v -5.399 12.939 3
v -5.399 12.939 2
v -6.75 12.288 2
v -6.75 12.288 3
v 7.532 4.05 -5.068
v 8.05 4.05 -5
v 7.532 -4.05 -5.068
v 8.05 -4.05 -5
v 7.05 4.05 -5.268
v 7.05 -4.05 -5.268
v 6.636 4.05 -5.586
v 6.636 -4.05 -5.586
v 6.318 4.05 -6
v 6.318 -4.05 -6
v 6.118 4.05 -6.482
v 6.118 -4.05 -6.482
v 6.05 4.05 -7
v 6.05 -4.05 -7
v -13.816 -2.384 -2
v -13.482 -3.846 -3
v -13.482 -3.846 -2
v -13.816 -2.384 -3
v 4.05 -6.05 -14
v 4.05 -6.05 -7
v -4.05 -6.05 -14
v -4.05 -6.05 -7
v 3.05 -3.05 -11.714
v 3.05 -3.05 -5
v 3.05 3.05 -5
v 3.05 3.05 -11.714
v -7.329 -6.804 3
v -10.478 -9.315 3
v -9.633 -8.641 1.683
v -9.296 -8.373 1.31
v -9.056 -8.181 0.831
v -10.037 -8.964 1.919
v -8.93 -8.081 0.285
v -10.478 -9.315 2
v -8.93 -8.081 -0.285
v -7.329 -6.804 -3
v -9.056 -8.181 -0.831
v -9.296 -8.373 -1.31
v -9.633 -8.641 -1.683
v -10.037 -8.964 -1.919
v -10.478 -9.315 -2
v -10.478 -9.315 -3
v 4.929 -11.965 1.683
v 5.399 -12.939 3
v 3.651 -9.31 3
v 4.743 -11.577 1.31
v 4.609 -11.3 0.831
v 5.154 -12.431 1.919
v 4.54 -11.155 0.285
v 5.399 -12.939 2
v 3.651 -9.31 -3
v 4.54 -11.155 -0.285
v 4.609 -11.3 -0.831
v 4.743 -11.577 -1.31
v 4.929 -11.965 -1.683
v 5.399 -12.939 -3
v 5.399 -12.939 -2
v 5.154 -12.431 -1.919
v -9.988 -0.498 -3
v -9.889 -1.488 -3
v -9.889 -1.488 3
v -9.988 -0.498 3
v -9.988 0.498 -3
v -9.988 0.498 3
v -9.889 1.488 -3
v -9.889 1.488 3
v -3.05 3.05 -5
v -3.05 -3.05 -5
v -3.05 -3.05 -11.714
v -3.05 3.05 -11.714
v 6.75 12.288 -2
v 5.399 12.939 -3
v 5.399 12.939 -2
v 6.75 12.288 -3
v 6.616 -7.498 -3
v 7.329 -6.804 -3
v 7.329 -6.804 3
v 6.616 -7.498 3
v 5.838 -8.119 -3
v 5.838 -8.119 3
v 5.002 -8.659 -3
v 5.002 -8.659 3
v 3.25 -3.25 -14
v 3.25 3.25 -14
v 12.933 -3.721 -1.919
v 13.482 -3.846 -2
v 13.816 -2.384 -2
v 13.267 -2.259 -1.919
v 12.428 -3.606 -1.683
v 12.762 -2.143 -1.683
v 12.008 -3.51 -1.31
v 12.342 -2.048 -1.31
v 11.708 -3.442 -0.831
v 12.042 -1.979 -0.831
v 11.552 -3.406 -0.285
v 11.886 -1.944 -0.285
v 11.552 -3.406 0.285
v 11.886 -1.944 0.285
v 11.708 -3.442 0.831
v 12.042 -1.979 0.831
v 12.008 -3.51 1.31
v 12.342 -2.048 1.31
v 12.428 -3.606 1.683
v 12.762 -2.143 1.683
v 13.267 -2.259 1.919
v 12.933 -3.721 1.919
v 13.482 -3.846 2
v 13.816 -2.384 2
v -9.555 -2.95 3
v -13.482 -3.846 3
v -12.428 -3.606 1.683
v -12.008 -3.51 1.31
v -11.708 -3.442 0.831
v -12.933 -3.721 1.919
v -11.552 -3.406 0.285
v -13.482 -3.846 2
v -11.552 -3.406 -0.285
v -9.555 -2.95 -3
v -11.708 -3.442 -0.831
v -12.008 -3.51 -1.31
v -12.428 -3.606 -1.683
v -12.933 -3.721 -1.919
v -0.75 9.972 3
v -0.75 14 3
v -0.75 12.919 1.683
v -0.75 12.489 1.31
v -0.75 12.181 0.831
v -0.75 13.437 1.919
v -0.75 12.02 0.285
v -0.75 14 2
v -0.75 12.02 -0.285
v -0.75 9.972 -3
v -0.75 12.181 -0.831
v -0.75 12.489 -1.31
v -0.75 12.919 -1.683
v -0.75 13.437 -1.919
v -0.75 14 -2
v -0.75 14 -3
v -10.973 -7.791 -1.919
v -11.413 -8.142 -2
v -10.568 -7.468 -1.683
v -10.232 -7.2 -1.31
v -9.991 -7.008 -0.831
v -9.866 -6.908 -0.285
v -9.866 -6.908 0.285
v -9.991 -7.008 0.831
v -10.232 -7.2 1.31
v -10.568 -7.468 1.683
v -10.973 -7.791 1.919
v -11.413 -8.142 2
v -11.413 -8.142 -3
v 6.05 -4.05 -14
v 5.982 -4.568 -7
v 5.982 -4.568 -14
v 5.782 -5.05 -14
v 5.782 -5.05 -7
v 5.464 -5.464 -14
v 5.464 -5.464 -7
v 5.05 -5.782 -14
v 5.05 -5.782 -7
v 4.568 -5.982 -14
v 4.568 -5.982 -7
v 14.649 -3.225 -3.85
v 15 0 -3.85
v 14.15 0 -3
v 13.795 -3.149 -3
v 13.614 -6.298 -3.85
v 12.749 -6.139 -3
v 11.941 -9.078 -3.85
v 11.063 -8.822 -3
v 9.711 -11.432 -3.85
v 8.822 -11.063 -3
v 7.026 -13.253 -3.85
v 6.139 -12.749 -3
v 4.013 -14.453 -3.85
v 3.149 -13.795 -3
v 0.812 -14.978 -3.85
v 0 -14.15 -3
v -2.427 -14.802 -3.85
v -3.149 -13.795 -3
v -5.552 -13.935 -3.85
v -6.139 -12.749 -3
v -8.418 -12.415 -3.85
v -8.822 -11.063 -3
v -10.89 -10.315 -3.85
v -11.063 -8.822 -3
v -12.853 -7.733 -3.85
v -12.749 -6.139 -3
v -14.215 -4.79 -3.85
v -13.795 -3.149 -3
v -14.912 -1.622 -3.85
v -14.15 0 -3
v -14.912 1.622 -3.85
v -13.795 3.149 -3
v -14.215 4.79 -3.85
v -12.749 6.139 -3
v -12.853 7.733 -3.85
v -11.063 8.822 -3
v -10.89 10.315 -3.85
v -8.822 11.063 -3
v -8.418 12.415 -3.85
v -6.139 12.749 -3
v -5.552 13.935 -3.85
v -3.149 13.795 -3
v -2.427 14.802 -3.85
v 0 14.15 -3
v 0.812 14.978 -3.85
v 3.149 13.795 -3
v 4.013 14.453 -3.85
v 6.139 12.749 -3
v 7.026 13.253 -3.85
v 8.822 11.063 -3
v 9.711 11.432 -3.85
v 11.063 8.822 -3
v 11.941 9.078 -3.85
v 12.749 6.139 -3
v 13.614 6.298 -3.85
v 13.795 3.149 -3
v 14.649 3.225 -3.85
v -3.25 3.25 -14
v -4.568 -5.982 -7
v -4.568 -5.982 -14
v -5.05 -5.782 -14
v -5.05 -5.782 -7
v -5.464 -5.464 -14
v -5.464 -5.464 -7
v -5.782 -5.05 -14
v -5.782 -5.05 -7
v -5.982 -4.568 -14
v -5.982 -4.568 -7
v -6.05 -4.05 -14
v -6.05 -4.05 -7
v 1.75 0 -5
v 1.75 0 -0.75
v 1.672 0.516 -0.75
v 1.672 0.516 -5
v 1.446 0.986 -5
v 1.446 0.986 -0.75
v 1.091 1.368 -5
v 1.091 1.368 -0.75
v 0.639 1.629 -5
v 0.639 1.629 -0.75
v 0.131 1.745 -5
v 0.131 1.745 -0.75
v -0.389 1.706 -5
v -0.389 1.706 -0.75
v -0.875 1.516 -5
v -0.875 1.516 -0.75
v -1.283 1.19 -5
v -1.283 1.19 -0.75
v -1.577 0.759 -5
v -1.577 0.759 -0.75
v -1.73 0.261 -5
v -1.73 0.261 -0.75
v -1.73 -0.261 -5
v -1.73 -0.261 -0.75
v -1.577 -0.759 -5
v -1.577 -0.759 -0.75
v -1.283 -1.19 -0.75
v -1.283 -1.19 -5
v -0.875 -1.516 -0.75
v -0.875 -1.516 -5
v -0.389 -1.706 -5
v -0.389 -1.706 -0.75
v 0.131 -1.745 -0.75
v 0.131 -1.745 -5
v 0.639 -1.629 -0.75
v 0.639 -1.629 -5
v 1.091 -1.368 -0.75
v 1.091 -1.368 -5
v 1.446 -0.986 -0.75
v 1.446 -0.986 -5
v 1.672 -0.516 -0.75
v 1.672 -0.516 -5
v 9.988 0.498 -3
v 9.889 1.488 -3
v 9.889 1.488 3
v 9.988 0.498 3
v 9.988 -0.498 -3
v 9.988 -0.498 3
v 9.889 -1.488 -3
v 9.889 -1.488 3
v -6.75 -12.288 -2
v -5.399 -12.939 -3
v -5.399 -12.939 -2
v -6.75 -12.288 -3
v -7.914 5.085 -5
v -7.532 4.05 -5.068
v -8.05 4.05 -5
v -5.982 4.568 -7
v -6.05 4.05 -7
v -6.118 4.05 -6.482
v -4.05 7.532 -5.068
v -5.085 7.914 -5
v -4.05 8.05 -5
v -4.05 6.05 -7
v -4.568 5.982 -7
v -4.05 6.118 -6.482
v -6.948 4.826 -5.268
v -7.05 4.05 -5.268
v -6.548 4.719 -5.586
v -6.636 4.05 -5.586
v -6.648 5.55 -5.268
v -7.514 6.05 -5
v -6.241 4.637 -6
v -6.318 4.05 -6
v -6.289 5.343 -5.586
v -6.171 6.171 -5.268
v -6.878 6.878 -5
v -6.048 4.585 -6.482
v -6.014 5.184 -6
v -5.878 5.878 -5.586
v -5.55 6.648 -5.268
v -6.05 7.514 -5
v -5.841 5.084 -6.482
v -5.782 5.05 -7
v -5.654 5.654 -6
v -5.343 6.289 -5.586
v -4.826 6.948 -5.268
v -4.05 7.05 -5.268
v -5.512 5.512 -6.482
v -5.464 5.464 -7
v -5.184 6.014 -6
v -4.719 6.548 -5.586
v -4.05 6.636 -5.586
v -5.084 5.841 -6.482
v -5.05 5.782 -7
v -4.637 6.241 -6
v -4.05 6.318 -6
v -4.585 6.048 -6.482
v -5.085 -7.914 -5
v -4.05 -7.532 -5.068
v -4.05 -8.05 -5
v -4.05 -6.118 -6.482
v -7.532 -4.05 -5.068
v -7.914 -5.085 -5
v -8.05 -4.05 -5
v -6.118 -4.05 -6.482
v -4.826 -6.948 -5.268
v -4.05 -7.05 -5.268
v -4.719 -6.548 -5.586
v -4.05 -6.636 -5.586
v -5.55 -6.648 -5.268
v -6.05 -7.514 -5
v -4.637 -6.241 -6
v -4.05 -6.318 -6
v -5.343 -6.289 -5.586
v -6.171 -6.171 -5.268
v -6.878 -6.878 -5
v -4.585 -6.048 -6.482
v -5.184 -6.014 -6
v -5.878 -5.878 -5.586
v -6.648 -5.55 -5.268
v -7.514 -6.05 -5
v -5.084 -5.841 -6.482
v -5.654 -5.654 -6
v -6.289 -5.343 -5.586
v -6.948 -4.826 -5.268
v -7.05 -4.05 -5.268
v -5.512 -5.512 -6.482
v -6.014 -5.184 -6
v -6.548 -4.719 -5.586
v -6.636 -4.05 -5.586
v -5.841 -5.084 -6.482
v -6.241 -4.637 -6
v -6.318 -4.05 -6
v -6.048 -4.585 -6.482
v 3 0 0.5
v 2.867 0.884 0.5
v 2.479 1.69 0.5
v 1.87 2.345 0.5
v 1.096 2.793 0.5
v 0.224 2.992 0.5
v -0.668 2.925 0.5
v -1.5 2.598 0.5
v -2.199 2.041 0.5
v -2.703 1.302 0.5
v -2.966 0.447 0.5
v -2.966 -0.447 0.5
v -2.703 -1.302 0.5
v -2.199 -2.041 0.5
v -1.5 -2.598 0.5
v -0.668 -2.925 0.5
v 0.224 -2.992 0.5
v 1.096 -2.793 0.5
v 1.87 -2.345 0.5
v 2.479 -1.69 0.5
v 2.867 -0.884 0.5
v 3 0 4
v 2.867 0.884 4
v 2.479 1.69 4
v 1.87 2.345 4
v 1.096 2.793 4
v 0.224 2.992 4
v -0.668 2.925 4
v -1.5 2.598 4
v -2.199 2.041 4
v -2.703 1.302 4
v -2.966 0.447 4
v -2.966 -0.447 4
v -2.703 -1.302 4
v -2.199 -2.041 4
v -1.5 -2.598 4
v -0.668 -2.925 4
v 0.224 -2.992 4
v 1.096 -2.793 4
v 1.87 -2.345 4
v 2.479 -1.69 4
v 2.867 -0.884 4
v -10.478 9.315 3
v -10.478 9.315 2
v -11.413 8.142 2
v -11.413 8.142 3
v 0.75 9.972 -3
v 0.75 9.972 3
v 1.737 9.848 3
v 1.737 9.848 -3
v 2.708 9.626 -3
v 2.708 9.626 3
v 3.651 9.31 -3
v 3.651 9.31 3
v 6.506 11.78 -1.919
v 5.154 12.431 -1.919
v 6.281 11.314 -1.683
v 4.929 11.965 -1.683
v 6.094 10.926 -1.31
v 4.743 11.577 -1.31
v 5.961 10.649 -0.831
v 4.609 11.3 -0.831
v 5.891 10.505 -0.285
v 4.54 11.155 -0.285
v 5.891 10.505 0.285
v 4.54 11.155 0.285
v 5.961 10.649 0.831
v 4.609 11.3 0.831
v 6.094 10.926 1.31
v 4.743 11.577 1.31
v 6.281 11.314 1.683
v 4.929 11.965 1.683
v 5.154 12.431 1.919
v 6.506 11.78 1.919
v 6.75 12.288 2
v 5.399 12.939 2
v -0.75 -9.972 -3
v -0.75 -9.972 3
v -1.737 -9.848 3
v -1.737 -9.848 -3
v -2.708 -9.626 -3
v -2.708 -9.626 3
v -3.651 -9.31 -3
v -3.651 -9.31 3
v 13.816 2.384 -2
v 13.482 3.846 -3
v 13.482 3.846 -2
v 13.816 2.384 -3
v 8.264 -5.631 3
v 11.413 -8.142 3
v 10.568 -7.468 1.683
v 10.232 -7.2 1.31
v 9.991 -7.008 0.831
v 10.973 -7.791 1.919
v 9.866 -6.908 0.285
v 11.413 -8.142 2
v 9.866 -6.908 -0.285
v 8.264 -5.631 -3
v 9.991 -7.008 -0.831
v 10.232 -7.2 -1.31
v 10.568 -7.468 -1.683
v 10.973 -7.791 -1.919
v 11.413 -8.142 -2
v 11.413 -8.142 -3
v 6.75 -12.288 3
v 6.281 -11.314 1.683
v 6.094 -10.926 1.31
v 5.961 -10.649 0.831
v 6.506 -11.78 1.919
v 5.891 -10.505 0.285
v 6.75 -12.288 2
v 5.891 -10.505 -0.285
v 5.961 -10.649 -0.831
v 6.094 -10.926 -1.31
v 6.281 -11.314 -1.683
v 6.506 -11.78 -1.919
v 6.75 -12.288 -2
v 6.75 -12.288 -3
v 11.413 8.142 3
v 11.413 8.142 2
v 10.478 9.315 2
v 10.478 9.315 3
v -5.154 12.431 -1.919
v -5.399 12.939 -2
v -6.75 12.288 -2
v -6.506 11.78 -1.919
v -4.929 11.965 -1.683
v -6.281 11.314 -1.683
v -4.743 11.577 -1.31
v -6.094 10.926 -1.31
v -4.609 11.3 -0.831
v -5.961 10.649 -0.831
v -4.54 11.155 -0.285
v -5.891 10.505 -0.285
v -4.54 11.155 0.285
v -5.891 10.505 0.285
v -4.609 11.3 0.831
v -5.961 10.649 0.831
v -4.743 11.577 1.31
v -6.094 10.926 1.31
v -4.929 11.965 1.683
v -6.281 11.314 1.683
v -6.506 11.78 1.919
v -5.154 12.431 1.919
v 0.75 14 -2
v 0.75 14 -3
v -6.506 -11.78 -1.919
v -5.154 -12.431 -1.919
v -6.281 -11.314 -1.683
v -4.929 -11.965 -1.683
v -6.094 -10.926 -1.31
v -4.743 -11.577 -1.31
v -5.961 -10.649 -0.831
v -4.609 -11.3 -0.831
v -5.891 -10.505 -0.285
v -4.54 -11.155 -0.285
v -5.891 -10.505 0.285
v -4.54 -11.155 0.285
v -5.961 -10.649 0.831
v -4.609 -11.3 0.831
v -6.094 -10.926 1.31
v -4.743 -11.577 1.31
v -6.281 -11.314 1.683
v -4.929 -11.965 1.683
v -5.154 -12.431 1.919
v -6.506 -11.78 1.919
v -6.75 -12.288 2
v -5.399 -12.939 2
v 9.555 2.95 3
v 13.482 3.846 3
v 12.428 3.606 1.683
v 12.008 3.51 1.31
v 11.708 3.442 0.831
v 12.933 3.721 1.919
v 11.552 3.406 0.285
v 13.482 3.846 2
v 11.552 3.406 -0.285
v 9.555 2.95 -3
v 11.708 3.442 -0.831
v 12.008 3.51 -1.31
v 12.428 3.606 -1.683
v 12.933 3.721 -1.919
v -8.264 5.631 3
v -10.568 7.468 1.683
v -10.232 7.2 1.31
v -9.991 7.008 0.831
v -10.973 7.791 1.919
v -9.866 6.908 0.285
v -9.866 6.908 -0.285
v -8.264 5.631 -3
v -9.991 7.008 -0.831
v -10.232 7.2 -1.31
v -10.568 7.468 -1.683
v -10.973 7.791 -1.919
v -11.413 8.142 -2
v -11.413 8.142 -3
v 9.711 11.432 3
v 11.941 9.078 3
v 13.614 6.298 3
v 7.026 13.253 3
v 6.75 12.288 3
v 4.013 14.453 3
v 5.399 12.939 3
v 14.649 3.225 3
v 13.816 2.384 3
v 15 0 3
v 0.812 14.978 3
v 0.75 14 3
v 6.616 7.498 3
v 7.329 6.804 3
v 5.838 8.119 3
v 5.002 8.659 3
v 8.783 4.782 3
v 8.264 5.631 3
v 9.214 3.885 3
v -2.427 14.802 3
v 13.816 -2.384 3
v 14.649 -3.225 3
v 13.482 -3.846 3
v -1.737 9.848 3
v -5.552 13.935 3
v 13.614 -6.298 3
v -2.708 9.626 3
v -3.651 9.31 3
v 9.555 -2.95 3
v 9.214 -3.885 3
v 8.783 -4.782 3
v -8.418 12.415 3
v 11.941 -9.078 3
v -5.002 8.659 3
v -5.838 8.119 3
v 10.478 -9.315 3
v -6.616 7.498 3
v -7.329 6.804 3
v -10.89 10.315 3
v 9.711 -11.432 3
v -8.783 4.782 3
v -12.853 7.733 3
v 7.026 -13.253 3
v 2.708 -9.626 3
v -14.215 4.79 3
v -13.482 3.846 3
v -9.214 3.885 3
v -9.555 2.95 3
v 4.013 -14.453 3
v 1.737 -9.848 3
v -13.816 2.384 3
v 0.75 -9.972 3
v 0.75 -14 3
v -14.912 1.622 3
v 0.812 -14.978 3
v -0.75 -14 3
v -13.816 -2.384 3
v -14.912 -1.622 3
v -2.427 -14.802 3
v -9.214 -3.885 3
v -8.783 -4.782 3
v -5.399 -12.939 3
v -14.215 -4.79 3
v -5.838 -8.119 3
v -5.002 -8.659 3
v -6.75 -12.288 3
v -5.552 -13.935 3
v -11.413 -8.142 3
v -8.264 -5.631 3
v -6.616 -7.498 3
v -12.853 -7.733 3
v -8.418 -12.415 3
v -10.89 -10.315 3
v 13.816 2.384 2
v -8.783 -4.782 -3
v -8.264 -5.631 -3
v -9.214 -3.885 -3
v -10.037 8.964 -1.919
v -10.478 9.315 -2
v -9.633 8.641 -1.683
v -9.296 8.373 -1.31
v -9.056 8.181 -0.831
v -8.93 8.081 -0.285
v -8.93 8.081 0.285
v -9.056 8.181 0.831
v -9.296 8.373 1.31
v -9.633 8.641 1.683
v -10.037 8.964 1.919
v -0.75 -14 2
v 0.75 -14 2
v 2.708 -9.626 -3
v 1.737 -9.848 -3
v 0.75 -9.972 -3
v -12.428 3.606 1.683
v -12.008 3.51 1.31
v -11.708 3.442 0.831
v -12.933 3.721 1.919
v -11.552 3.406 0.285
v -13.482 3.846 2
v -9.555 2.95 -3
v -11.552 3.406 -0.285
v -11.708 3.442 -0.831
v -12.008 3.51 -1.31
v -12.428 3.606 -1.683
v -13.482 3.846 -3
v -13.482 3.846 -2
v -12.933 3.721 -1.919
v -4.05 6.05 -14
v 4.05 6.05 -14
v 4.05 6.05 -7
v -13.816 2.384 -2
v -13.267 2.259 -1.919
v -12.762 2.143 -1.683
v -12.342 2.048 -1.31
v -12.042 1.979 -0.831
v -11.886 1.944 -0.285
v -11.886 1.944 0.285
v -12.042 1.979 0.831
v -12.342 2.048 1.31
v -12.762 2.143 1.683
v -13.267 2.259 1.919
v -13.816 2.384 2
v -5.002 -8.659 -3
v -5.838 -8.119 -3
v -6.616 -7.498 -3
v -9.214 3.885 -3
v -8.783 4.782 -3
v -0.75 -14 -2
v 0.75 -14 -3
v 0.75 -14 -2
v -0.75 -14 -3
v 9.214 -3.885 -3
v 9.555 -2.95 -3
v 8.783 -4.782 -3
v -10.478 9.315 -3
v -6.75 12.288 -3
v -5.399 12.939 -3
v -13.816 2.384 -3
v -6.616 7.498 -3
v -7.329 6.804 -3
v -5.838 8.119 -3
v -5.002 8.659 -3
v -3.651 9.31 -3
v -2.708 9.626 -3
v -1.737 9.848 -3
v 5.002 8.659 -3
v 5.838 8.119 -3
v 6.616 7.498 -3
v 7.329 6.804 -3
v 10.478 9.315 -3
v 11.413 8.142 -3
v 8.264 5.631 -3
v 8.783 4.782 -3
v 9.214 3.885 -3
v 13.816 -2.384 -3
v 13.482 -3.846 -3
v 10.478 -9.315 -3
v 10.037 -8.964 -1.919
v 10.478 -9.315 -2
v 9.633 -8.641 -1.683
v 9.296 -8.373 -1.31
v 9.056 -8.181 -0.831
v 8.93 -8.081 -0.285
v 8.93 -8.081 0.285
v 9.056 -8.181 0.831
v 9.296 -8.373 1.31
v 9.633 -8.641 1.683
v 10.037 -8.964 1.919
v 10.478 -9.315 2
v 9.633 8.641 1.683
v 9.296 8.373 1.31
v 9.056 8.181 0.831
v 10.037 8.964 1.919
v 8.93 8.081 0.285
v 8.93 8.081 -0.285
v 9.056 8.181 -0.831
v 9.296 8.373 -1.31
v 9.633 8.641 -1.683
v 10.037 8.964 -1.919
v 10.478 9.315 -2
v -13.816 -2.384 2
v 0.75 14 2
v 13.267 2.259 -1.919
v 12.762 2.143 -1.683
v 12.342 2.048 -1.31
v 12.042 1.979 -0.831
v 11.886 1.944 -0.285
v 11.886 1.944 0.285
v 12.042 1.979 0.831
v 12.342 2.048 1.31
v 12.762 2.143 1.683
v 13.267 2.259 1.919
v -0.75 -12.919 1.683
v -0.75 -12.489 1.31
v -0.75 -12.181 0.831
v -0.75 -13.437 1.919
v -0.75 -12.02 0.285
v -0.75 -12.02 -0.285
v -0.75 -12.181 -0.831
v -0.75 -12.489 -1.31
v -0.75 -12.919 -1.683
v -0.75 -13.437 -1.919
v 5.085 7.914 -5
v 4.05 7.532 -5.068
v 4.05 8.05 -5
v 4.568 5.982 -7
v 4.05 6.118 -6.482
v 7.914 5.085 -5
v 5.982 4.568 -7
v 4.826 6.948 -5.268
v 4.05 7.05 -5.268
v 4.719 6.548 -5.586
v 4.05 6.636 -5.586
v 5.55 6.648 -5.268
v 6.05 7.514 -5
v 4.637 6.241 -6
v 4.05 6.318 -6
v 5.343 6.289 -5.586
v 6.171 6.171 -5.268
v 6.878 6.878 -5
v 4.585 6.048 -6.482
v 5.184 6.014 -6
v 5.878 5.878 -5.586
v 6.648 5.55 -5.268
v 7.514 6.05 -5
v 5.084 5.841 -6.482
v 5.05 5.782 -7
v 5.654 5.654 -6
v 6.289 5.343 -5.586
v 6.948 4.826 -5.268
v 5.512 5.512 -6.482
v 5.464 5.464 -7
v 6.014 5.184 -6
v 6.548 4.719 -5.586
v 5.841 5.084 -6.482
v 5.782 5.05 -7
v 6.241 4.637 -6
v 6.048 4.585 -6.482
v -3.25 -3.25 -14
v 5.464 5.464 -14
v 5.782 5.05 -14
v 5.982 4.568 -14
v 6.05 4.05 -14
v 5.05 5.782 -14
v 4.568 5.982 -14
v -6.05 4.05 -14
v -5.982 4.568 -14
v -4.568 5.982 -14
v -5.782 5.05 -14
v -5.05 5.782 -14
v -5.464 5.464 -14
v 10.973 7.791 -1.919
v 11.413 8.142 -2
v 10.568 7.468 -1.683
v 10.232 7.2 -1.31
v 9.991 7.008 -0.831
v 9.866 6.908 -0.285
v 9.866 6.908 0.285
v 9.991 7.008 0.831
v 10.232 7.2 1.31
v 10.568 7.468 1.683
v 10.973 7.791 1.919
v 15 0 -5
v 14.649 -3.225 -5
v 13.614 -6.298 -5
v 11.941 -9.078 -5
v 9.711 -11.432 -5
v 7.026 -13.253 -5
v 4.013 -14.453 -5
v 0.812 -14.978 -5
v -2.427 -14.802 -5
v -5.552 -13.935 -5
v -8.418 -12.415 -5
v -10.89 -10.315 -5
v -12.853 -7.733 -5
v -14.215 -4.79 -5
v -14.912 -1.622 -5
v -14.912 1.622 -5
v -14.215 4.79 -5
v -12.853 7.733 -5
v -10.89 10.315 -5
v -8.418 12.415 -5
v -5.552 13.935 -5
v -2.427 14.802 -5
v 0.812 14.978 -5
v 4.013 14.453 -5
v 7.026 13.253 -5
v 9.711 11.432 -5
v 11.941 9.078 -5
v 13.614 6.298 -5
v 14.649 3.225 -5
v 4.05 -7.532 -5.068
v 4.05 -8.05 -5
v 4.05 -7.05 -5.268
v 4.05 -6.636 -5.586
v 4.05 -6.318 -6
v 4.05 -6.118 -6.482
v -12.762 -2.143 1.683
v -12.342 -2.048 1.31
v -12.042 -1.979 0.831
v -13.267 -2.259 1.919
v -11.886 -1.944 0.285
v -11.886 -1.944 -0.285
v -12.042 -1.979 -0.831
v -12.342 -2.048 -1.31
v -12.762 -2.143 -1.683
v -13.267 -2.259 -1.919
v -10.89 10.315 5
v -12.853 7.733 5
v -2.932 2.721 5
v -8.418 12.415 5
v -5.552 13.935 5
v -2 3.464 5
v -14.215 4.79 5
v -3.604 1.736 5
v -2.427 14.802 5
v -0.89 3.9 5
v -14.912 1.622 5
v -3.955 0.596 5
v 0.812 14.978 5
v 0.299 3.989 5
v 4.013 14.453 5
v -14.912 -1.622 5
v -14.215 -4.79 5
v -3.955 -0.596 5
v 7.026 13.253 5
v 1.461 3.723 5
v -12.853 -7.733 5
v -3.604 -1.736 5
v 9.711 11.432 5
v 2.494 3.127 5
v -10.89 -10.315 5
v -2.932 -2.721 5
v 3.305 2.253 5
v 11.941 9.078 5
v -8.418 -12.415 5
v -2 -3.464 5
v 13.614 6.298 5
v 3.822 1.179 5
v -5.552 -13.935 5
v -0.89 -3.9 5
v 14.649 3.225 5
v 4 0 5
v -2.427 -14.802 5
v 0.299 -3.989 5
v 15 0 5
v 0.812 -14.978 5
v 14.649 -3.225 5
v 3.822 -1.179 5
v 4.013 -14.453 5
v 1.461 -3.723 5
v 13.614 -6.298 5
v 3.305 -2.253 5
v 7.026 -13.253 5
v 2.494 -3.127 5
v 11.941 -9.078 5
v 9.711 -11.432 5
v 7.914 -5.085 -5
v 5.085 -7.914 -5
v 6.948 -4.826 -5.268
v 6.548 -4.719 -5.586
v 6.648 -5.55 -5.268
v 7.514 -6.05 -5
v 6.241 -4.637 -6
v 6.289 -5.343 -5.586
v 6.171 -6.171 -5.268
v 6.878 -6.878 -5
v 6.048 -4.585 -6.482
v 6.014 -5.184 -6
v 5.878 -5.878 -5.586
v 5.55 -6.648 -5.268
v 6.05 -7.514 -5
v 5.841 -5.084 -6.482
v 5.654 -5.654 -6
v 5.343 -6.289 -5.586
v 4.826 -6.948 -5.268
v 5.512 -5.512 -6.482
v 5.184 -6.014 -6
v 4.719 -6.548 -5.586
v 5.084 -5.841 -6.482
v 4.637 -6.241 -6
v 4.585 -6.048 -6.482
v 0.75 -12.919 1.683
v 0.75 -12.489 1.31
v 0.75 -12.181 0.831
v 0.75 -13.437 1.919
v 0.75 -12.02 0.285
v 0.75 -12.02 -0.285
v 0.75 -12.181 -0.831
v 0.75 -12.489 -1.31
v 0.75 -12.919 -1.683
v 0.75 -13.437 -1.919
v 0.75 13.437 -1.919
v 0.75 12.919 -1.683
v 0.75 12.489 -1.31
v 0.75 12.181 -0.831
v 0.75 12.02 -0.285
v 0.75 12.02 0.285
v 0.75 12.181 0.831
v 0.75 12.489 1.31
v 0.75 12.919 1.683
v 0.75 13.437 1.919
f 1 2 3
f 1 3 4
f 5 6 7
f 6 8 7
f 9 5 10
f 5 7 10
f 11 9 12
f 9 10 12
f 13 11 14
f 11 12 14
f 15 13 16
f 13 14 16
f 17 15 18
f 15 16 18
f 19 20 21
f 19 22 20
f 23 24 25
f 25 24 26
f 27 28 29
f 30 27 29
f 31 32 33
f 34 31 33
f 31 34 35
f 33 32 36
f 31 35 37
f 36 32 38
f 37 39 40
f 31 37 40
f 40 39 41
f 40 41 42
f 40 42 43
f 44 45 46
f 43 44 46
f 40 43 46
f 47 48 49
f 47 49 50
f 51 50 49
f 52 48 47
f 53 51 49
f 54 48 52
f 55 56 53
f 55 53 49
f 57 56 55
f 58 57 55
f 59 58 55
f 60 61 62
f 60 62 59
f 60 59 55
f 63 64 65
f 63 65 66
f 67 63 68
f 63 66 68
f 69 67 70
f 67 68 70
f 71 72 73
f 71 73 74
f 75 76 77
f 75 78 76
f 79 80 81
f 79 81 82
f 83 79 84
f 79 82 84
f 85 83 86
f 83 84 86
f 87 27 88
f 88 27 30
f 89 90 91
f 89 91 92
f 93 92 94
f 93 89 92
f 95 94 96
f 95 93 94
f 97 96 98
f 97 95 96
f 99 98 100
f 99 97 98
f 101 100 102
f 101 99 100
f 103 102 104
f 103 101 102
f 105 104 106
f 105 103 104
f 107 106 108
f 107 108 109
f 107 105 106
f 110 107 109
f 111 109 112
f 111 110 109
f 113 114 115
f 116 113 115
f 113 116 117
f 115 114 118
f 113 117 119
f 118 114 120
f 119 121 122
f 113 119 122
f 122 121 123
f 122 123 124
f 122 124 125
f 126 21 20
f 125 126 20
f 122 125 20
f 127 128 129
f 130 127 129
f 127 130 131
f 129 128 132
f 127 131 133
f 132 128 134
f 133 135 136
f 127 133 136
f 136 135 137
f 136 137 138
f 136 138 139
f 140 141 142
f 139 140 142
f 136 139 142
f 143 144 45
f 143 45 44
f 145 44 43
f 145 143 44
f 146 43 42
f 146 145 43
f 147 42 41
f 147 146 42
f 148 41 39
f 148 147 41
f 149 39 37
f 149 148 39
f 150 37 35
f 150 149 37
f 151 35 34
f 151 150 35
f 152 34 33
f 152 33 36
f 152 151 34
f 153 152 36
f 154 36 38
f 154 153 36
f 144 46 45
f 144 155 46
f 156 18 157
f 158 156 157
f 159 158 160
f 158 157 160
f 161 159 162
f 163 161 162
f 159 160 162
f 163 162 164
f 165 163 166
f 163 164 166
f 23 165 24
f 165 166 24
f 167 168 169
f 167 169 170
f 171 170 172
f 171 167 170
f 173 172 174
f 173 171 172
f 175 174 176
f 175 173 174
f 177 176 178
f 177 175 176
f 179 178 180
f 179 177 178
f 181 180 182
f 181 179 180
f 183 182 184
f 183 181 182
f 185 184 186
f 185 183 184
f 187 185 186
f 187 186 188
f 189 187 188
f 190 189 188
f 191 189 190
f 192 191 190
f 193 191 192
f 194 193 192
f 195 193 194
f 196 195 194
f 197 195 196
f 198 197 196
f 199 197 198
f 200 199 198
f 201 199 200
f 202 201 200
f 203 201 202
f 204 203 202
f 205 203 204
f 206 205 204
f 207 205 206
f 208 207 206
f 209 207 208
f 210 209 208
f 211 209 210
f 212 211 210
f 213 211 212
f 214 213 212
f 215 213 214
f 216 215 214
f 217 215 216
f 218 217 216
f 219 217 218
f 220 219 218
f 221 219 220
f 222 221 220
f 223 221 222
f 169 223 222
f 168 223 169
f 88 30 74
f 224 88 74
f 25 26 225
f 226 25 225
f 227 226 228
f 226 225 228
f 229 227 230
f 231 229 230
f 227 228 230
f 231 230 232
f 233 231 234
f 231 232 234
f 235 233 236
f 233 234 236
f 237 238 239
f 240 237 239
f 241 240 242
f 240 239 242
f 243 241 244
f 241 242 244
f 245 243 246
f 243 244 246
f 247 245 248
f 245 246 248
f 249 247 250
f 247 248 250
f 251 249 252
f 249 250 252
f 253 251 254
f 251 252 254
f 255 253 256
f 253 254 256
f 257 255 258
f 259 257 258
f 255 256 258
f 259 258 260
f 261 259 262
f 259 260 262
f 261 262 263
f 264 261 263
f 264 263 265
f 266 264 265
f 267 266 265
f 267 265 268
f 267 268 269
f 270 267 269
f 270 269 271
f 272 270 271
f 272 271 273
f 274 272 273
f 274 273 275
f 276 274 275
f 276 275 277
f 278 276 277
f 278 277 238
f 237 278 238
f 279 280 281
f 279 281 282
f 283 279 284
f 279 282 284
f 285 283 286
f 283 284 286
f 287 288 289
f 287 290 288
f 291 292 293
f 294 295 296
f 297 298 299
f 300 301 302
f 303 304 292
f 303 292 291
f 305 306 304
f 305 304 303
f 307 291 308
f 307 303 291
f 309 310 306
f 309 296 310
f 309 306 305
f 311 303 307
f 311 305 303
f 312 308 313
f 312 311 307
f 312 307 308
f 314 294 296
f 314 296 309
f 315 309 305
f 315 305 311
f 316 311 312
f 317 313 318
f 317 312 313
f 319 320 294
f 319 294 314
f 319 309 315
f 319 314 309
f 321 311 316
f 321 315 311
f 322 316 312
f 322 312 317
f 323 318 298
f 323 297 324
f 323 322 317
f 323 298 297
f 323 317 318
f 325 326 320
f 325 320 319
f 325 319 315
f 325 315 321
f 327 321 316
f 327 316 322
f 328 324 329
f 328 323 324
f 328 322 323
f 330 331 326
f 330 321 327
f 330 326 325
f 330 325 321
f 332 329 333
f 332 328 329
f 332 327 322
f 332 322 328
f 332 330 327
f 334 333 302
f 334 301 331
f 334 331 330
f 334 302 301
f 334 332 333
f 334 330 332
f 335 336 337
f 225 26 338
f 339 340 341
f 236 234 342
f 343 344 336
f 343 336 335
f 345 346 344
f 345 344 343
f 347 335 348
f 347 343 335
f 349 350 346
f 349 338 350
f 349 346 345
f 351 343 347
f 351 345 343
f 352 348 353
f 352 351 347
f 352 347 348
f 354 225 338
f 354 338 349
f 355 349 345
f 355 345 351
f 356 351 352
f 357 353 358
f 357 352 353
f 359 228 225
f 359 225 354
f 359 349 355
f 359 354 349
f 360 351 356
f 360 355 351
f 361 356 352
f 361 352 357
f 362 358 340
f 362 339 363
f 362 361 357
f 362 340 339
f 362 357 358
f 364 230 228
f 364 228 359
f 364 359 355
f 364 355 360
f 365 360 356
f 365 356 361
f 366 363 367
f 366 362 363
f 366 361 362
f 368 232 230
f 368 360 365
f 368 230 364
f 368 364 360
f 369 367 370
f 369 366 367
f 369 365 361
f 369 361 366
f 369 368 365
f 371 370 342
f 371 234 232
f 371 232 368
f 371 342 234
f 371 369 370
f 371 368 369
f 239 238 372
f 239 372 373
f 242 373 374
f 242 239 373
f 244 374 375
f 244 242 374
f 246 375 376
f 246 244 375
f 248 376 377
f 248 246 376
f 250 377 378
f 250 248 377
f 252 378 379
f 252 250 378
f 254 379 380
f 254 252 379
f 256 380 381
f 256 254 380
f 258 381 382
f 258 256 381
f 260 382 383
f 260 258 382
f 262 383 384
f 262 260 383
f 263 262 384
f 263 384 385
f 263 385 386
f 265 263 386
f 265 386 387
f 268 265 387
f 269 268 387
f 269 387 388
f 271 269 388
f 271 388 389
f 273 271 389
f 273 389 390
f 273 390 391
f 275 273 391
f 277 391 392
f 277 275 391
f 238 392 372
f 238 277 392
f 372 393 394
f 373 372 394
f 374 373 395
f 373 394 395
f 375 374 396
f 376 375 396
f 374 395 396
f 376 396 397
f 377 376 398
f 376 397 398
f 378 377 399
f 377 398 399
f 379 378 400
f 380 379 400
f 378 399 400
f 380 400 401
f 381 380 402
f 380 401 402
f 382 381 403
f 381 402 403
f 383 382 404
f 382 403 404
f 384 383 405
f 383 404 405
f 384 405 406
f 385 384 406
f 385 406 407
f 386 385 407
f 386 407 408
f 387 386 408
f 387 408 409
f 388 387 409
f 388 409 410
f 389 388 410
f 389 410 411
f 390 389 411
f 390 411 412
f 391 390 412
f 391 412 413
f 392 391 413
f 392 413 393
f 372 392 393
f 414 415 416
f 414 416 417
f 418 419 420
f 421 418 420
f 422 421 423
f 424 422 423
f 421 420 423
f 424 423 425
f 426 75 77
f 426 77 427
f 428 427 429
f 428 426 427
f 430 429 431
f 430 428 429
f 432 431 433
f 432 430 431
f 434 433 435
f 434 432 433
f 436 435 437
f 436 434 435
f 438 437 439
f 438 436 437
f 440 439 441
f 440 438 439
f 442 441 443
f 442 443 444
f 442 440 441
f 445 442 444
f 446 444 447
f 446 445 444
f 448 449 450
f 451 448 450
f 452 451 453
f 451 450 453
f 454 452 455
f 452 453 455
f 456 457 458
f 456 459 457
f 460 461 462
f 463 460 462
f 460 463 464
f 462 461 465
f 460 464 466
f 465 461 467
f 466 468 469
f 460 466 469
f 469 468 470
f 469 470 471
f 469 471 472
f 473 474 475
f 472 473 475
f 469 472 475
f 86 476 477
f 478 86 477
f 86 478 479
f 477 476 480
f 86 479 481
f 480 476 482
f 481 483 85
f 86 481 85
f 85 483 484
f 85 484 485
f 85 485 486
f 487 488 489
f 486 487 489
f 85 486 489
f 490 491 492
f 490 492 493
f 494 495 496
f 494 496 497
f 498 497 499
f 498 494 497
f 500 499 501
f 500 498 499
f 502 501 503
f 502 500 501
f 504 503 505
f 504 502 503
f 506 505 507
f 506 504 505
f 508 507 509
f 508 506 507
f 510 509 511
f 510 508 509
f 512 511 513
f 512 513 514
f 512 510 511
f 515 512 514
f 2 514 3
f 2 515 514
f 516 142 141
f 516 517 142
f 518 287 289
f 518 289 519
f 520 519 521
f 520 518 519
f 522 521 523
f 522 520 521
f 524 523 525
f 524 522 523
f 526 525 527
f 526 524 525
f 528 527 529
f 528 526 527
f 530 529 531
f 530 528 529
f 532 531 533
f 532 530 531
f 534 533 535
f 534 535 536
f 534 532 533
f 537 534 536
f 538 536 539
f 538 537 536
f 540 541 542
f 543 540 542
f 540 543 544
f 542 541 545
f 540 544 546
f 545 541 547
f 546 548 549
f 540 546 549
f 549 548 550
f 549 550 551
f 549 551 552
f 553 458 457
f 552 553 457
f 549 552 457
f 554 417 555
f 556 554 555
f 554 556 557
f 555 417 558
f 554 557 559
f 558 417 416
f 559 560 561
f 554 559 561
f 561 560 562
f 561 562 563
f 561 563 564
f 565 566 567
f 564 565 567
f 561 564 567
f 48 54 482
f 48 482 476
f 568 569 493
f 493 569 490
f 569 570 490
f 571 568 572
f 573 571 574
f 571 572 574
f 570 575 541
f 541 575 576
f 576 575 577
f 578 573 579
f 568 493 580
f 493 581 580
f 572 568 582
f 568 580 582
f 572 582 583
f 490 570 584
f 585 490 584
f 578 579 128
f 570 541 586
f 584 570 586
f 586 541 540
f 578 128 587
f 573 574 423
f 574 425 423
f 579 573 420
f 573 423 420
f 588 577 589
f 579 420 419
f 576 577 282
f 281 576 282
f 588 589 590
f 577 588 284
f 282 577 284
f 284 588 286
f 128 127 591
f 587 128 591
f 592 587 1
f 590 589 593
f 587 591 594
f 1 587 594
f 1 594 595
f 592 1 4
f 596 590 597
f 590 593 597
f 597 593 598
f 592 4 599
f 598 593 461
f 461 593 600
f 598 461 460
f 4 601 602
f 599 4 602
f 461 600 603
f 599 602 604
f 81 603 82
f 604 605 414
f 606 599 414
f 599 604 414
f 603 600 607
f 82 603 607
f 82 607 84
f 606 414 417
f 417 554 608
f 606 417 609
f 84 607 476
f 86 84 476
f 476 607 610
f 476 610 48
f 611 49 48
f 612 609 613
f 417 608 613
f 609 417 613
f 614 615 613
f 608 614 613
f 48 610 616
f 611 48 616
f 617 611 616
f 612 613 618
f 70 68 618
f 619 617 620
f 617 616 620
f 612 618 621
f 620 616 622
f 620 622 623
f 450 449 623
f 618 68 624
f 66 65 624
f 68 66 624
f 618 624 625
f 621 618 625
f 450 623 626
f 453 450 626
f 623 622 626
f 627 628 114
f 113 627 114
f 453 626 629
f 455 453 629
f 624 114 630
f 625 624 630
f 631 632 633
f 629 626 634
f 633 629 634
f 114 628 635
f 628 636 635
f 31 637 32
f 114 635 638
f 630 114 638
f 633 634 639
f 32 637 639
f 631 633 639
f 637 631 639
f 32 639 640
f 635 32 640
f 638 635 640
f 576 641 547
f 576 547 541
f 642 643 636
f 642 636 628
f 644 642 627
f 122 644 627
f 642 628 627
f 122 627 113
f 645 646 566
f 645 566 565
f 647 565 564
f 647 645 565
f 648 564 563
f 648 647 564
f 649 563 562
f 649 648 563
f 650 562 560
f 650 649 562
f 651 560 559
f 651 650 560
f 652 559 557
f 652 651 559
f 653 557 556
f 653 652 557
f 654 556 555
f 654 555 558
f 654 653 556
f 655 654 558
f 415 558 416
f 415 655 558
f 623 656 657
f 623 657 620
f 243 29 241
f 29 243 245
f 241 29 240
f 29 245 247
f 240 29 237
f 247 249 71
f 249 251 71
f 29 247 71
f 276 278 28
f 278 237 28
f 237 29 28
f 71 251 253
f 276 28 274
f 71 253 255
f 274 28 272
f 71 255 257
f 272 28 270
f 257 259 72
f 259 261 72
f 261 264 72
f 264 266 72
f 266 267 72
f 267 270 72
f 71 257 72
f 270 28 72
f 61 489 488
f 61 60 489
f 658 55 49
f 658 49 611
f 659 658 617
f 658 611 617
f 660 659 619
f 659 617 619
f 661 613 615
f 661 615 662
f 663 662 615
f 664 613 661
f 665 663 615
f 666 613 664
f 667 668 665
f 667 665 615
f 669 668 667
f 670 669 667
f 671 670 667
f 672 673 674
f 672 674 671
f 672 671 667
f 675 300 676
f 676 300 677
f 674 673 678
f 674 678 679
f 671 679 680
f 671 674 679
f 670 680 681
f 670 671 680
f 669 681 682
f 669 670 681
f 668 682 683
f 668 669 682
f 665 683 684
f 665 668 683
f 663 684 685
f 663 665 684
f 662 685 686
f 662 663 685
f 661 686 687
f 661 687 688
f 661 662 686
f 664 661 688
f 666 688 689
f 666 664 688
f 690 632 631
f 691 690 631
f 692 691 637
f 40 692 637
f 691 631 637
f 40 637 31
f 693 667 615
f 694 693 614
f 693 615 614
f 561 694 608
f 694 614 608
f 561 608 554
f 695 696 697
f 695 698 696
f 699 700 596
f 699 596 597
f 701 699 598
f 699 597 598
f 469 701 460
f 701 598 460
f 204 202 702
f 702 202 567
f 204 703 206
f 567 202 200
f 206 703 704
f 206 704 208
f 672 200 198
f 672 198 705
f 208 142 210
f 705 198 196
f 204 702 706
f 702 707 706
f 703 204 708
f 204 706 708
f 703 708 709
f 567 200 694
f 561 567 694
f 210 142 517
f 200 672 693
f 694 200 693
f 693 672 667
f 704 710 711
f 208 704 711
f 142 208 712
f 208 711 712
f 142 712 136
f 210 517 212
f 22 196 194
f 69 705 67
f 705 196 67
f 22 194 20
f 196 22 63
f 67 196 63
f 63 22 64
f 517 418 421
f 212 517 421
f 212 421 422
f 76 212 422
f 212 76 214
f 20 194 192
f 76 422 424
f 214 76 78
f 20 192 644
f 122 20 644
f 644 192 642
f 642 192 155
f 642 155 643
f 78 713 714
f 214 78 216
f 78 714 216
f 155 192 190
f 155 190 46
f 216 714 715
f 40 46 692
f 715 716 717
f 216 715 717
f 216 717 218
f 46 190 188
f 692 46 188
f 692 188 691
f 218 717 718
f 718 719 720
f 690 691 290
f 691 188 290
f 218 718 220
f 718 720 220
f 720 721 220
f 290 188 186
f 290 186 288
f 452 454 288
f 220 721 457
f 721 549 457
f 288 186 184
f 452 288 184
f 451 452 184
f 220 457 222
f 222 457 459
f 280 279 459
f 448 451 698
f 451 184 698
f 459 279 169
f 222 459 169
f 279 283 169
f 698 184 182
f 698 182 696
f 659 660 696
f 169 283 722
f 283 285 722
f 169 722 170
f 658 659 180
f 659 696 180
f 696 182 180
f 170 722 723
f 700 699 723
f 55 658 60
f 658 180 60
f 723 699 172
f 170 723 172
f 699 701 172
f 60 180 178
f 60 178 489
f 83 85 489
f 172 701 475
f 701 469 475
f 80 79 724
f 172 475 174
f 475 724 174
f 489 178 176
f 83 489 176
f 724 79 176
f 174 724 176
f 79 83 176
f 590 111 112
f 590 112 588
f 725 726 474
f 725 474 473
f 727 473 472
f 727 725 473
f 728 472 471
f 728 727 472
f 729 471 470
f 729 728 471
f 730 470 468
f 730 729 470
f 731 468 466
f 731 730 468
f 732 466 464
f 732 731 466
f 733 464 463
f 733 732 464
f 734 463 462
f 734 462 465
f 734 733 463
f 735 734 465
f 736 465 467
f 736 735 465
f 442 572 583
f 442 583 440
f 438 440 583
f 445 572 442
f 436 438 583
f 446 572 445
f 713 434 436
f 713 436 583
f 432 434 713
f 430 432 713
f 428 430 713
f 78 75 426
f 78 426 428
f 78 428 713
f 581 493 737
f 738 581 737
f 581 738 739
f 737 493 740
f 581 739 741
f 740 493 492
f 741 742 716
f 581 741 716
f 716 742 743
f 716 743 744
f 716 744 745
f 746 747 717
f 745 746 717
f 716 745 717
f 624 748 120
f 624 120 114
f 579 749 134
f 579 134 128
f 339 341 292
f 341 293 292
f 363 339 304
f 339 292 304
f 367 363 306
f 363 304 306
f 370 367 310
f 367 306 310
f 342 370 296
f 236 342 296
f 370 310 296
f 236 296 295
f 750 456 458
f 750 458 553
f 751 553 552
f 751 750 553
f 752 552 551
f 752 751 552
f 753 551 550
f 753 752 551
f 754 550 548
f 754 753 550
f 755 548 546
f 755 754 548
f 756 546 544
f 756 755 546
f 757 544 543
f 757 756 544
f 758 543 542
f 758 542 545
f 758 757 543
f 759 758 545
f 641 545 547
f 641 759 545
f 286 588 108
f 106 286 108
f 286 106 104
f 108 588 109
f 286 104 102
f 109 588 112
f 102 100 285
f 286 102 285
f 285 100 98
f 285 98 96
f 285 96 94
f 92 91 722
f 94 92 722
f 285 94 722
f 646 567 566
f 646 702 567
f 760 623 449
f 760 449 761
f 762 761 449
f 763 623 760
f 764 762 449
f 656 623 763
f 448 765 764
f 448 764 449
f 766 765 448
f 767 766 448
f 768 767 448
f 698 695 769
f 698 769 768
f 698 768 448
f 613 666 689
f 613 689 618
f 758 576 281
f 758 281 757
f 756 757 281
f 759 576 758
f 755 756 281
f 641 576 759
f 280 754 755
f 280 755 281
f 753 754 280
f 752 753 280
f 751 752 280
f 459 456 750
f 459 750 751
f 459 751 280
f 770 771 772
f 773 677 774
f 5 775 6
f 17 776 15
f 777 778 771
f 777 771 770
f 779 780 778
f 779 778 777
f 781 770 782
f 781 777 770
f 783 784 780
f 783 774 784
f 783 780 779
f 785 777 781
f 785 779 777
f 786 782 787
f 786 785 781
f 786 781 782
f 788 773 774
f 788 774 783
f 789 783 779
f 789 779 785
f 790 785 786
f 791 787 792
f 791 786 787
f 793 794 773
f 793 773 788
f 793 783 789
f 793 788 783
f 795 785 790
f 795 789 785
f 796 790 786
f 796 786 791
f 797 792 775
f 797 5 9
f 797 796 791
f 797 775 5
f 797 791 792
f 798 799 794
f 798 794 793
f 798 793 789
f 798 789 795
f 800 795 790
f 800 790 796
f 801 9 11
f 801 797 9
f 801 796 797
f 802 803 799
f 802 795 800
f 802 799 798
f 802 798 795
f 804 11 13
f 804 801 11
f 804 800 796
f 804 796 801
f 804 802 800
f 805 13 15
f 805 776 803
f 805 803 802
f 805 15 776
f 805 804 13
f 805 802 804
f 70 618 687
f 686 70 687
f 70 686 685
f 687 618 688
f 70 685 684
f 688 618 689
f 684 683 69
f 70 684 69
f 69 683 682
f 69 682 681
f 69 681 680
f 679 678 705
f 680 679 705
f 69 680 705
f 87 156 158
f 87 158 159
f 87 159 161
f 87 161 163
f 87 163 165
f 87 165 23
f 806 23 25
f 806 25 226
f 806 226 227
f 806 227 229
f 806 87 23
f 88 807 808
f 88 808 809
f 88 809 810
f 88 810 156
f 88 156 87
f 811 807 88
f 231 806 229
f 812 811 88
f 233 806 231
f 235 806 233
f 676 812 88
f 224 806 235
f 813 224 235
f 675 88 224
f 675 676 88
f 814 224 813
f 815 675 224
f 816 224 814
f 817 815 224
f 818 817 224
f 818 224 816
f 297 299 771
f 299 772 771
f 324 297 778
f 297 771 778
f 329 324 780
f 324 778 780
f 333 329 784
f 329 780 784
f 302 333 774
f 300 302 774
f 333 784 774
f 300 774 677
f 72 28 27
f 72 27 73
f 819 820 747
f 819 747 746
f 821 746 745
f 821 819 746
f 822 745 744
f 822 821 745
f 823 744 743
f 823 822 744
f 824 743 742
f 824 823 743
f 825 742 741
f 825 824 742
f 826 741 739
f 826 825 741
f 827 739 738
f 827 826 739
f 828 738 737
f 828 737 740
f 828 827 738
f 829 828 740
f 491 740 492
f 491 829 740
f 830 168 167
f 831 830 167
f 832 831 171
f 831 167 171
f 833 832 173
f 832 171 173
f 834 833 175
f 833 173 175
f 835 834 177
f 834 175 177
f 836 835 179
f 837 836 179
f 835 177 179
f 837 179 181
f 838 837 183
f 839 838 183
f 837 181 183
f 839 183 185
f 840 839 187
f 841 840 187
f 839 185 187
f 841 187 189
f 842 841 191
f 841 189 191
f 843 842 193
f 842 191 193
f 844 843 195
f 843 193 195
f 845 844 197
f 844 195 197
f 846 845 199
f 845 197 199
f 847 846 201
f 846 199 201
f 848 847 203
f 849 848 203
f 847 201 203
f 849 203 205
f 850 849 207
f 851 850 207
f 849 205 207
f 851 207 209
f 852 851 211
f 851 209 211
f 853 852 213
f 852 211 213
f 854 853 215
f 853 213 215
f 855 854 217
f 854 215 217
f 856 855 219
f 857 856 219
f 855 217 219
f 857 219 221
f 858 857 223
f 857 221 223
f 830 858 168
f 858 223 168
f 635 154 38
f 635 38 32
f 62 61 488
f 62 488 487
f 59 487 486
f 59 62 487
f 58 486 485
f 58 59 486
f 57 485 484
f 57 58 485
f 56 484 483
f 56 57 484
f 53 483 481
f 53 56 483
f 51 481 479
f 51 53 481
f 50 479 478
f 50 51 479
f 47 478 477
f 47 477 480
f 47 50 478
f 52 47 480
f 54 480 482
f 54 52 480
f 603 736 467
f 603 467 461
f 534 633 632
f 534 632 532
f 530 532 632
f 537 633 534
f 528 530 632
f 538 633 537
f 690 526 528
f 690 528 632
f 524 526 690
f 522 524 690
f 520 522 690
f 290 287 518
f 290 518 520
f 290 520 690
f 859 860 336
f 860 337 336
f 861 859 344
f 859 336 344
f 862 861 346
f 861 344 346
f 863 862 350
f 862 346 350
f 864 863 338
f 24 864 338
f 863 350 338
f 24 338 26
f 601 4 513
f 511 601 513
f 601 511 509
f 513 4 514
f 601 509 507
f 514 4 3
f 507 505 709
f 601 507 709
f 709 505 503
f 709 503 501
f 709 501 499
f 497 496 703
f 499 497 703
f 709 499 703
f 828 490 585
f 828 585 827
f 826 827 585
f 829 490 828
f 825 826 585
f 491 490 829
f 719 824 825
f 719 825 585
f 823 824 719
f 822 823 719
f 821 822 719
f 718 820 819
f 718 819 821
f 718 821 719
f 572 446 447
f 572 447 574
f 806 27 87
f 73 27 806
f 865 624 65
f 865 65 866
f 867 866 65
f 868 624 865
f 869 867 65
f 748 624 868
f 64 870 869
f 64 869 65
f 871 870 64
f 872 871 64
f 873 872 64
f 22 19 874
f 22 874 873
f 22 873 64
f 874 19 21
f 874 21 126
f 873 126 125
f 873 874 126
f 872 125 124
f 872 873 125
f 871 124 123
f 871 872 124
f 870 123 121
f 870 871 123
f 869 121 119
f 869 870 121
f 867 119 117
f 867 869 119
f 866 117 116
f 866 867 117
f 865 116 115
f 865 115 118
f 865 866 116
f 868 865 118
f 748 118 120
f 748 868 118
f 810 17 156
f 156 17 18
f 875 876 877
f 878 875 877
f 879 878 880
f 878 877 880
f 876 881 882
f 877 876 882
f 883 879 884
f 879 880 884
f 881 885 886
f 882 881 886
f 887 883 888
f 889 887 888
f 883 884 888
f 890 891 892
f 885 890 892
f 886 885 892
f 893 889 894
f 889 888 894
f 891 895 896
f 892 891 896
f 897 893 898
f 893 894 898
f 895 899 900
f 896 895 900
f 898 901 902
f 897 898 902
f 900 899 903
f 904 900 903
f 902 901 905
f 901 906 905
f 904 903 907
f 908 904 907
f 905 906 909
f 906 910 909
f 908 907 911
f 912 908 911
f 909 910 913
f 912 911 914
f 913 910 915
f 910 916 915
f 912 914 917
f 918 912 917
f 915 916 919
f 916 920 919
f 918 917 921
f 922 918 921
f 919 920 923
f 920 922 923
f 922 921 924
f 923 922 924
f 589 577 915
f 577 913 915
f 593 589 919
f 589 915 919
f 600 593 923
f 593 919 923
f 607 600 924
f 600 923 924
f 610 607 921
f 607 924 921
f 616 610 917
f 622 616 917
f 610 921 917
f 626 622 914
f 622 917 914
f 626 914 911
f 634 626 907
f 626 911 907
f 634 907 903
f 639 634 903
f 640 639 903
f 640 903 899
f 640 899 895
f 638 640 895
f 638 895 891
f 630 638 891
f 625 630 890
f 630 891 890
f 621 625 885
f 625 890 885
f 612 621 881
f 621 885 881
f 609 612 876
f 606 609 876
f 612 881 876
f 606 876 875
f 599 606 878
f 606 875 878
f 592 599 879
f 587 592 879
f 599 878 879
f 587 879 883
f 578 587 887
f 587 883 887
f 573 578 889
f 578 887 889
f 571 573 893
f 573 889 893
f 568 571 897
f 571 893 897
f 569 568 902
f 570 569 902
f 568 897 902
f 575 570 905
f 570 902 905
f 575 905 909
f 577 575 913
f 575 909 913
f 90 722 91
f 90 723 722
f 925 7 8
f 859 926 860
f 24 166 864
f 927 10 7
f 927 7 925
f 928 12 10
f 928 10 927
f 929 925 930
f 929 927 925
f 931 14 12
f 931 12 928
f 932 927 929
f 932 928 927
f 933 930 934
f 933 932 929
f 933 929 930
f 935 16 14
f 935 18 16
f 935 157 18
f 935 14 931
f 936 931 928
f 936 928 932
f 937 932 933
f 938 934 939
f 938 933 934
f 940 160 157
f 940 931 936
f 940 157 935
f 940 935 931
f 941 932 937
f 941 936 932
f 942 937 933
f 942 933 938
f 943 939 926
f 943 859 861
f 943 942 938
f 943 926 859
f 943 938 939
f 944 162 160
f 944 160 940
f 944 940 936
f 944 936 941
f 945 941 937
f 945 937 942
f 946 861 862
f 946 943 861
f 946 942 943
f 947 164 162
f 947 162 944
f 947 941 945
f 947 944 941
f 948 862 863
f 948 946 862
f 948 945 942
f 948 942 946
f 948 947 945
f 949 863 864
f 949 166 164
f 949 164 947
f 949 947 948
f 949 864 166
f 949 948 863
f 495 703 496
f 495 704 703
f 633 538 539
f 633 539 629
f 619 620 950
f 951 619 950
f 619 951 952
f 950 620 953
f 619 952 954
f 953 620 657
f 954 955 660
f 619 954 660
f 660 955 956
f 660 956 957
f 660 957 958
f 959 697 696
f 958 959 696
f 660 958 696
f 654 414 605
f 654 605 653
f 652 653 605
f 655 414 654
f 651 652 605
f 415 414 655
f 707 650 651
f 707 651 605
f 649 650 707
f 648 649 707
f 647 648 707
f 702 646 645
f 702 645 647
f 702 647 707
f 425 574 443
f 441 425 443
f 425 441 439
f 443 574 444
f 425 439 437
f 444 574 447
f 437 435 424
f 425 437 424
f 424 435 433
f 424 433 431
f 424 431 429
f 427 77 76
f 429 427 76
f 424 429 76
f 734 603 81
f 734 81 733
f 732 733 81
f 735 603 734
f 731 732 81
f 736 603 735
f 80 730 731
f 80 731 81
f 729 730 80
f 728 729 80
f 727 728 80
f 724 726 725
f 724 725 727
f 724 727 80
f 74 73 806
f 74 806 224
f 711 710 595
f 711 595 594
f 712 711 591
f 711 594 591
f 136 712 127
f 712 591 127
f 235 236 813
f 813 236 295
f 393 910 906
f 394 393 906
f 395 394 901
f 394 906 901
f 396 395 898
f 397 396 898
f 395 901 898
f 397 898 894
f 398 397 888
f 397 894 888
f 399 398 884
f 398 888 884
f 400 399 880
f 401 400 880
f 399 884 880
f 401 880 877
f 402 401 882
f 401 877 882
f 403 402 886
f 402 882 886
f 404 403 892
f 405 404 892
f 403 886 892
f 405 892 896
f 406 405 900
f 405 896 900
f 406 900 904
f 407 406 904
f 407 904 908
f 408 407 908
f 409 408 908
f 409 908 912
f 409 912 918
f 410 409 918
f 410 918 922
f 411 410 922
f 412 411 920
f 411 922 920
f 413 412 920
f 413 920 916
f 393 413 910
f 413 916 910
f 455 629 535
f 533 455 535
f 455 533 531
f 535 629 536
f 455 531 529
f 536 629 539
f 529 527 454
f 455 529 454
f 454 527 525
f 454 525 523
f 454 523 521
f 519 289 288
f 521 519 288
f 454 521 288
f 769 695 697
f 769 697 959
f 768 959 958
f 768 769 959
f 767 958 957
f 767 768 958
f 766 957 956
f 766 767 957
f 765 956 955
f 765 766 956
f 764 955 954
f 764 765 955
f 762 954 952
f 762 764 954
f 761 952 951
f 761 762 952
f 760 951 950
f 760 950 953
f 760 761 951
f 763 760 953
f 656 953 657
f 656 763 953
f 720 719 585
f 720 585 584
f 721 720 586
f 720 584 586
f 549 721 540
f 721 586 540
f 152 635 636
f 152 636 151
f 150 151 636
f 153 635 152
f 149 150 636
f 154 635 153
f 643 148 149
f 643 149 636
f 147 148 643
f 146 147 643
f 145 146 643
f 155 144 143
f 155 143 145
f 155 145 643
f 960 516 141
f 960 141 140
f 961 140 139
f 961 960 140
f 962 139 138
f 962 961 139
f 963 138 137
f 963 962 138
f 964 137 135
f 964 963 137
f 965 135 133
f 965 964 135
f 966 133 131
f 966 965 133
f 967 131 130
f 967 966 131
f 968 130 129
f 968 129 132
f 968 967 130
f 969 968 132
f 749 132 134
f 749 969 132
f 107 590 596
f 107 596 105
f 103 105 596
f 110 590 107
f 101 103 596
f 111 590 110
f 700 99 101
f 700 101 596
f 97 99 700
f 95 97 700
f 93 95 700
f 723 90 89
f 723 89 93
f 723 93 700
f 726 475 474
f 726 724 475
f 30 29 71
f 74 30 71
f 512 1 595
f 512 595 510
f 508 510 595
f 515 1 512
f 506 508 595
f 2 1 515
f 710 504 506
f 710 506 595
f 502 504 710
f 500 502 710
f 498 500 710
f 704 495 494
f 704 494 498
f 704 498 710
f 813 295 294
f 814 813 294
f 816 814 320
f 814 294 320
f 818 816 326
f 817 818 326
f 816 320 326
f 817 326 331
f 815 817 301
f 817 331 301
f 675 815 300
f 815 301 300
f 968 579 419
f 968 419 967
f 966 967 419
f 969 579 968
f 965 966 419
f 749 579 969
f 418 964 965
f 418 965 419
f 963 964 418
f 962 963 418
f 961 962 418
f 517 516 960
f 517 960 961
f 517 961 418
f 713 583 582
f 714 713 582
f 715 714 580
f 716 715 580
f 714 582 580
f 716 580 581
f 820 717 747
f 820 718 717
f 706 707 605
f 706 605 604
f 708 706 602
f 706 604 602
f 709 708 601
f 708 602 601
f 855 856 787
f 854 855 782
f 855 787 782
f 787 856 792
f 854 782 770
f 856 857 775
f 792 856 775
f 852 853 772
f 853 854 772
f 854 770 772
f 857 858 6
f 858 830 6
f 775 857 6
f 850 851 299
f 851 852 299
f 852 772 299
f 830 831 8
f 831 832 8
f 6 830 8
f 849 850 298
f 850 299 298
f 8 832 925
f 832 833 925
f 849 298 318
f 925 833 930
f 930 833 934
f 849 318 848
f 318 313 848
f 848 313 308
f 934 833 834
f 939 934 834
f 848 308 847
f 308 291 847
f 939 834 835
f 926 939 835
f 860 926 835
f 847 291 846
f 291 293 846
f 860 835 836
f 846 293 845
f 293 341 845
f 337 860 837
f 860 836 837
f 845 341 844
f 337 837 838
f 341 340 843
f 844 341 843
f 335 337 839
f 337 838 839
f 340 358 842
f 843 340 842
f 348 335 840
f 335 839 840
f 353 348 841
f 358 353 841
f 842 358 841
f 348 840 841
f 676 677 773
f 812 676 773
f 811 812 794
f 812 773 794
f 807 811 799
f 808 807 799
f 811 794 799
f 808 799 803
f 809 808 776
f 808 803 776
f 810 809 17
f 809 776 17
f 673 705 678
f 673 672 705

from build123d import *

# Parameters (mm, degrees)
EXTRUDE_1_DEPTH          = 0.75
PATTERN_CIRCULAR_1_COUNT = 14
SKETCH_3_W               = 6.1
SKETCH_3_H               = 6.1
EXTRUDE_2_DEPTH          = 9
FILLET_1_R               = 2
CHAMFER_1_SIZE           = 0.2
CHAMFER_1_SIZE2          = 2.286010461
SKETCH_4_R               = 1.75
CUT_EXTRUDE_1_DEPTH      = 29.478061732
SKETCH_6_R               = 3
CUT_EXTRUDE_2_DEPTH      = 6
CHAMFER_2_SIZE           = 1
CHAMFER_3_SIZE           = 1.5
CHAMFER_4_SIZE           = 0.85


with BuildPart() as part:
    # 草圖1 → 旋轉1 (revolve)
    with BuildSketch(Plane(origin=(0, 0, 0), x_dir=(0, 0, -1), z_dir=(1, 0, 0)), mode=Mode.PRIVATE) as revolve_1_sk:
        Polygon((-5, 0), (5, 0), (5, 15), (3, 15), (3, 10), (-3, 10), (-3, 15), (-5, 15), align=None)
    revolve(revolve_1_sk.sketch.rotate(Axis((0, 0, 5), (0, 0, -1)), 90), axis=Axis((0, 0, 5), (0, 0, -1)))

    # 草圖2 → 填料-伸長1 (add, symmetric)
    with BuildSketch(Plane(origin=(0, 0, 0), x_dir=(0, 0, -1), z_dir=(1, 0, 0))):
        with BuildLine():
            Line((3, 10), (3, 14))
            Line((3, 14), (2, 14))
            ThreePointArc((2, 14), (0, 12), (-2, 14))
            Line((-2, 14), (-3, 14))
            Line((-3, 14), (-3, 10))
            Line((-3, 10), (-3, 8.5))
            Line((-3, 8.5), (3, 8.5))
            Line((3, 8.5), (3, 10))
        make_face()
    extrude_1 = extrude(amount=EXTRUDE_1_DEPTH, both=True)

    # 環狀複製排列1: 填料-伸長1 ×14 about axis
    pattern_circular_1_axis = Axis((0, 0, 0), (0, 0, 1))
    for i in range(1, PATTERN_CIRCULAR_1_COUNT):
        add(extrude_1.rotate(pattern_circular_1_axis, i * 360 / PATTERN_CIRCULAR_1_COUNT))

    # 草圖3 → 填料-伸長2 (add)
    with BuildSketch(Plane(origin=(0, 0, -5), x_dir=(-1, 0, 0), z_dir=(0, 0, -1))):
        with BuildLine():
            Line((-4.05, -6.05), (4.05, -6.05))
            ThreePointArc((4.05, -6.05), (5.464213562, -5.464213562), (6.05, -4.05))
            Line((6.05, -4.05), (6.05, 4.05))
            ThreePointArc((6.05, 4.05), (5.464213562, 5.464213562), (4.05, 6.05))
            Line((4.05, 6.05), (-4.05, 6.05))
            ThreePointArc((-4.05, 6.05), (-5.464213562, 5.464213562), (-6.05, 4.05))
            Line((-6.05, 4.05), (-6.05, -4.05))
            ThreePointArc((-6.05, -4.05), (-5.464213562, -5.464213562), (-4.05, -6.05))
        make_face()
        Rectangle(SKETCH_3_W, SKETCH_3_H, mode=Mode.SUBTRACT)
    extrude(amount=EXTRUDE_2_DEPTH)

    # 圓角1
    fillet_1_edges = [part.edges().sort_by_distance(p)[0] for p in [
        (5.464213562, -5.464213562, -5),
        (0, -6.05, -5),
        (-5.464213562, -5.464213562, -5),
        (-6.05, 0, -5),
        (-5.464213562, 5.464213562, -5),
        (0, 6.05, -5),
        (5.464213562, 5.464213562, -5),
        (6.05, 0, -5),
    ]]
    fillet(fillet_1_edges, radius=FILLET_1_R)

    # 導角1
    chamfer_1_edges = [part.edges().sort_by_distance(p)[0] for p in [
        (-3.05, 0, -14),
        (0, 3.05, -14),
        (3.05, 0, -14),
        (0, -3.05, -14),
    ]]
    chamfer_1_side = [part.faces().sort_by_distance(p)[0] for p in [
        (5.343213562, -5.343213562, -14),
    ]]
    chamfer(chamfer_1_edges, length=CHAMFER_1_SIZE, length2=CHAMFER_1_SIZE2, reference=chamfer_1_side[0])

    # 草圖4 → 除料-伸長1 (cut, through all)
    with BuildSketch(Plane.XY.offset(5)):
        Circle(SKETCH_4_R)
    extrude(amount=-CUT_EXTRUDE_1_DEPTH, mode=Mode.SUBTRACT)

    # 草圖6 → 除料-伸長2 (cut)
    with BuildSketch(Plane.XY.offset(5)):
        Circle(SKETCH_6_R)
    extrude(amount=-CUT_EXTRUDE_2_DEPTH, mode=Mode.SUBTRACT)

    # 導角2
    chamfer_2_edges = [part.edges().sort_by_distance(p)[0] for p in [
        (-3, 0, 5),
    ]]
    chamfer(chamfer_2_edges, length=CHAMFER_2_SIZE)

    # 導角3
    # the kernel refuses this chamfer: 1.5 mm, written as the material it adds along each edge
    with BuildSketch(Plane(origin=(0, 0, -1), x_dir=(1, 0, 0), z_dir=(0, -1, 0))) as chamfer_3_piece_1_section:
        Polygon((3, CHAMFER_3_SIZE), (3 - CHAMFER_3_SIZE, 0), (3, 0), align=None)
    chamfer_3_piece_1 = revolve(axis=Axis((0, 0, -1), (0, 0, 1)), mode=Mode.PRIVATE)
    chamfer_3_piece_1 = chamfer_3_piece_1 - Plane(origin=(0, 0, -0.122651597), x_dir=(1, 0, 0), z_dir=(0, 0, 1)) * Cylinder(1.75, 12, mode=Mode.PRIVATE)
    add(chamfer_3_piece_1)

    # 導角4
    chamfer_4_edges = [part.edges().sort_by_distance(p)[0] for p in [
        (-15, 0, -3),
    ]]
    chamfer(chamfer_4_edges, length=CHAMFER_4_SIZE)


solid = part.part
